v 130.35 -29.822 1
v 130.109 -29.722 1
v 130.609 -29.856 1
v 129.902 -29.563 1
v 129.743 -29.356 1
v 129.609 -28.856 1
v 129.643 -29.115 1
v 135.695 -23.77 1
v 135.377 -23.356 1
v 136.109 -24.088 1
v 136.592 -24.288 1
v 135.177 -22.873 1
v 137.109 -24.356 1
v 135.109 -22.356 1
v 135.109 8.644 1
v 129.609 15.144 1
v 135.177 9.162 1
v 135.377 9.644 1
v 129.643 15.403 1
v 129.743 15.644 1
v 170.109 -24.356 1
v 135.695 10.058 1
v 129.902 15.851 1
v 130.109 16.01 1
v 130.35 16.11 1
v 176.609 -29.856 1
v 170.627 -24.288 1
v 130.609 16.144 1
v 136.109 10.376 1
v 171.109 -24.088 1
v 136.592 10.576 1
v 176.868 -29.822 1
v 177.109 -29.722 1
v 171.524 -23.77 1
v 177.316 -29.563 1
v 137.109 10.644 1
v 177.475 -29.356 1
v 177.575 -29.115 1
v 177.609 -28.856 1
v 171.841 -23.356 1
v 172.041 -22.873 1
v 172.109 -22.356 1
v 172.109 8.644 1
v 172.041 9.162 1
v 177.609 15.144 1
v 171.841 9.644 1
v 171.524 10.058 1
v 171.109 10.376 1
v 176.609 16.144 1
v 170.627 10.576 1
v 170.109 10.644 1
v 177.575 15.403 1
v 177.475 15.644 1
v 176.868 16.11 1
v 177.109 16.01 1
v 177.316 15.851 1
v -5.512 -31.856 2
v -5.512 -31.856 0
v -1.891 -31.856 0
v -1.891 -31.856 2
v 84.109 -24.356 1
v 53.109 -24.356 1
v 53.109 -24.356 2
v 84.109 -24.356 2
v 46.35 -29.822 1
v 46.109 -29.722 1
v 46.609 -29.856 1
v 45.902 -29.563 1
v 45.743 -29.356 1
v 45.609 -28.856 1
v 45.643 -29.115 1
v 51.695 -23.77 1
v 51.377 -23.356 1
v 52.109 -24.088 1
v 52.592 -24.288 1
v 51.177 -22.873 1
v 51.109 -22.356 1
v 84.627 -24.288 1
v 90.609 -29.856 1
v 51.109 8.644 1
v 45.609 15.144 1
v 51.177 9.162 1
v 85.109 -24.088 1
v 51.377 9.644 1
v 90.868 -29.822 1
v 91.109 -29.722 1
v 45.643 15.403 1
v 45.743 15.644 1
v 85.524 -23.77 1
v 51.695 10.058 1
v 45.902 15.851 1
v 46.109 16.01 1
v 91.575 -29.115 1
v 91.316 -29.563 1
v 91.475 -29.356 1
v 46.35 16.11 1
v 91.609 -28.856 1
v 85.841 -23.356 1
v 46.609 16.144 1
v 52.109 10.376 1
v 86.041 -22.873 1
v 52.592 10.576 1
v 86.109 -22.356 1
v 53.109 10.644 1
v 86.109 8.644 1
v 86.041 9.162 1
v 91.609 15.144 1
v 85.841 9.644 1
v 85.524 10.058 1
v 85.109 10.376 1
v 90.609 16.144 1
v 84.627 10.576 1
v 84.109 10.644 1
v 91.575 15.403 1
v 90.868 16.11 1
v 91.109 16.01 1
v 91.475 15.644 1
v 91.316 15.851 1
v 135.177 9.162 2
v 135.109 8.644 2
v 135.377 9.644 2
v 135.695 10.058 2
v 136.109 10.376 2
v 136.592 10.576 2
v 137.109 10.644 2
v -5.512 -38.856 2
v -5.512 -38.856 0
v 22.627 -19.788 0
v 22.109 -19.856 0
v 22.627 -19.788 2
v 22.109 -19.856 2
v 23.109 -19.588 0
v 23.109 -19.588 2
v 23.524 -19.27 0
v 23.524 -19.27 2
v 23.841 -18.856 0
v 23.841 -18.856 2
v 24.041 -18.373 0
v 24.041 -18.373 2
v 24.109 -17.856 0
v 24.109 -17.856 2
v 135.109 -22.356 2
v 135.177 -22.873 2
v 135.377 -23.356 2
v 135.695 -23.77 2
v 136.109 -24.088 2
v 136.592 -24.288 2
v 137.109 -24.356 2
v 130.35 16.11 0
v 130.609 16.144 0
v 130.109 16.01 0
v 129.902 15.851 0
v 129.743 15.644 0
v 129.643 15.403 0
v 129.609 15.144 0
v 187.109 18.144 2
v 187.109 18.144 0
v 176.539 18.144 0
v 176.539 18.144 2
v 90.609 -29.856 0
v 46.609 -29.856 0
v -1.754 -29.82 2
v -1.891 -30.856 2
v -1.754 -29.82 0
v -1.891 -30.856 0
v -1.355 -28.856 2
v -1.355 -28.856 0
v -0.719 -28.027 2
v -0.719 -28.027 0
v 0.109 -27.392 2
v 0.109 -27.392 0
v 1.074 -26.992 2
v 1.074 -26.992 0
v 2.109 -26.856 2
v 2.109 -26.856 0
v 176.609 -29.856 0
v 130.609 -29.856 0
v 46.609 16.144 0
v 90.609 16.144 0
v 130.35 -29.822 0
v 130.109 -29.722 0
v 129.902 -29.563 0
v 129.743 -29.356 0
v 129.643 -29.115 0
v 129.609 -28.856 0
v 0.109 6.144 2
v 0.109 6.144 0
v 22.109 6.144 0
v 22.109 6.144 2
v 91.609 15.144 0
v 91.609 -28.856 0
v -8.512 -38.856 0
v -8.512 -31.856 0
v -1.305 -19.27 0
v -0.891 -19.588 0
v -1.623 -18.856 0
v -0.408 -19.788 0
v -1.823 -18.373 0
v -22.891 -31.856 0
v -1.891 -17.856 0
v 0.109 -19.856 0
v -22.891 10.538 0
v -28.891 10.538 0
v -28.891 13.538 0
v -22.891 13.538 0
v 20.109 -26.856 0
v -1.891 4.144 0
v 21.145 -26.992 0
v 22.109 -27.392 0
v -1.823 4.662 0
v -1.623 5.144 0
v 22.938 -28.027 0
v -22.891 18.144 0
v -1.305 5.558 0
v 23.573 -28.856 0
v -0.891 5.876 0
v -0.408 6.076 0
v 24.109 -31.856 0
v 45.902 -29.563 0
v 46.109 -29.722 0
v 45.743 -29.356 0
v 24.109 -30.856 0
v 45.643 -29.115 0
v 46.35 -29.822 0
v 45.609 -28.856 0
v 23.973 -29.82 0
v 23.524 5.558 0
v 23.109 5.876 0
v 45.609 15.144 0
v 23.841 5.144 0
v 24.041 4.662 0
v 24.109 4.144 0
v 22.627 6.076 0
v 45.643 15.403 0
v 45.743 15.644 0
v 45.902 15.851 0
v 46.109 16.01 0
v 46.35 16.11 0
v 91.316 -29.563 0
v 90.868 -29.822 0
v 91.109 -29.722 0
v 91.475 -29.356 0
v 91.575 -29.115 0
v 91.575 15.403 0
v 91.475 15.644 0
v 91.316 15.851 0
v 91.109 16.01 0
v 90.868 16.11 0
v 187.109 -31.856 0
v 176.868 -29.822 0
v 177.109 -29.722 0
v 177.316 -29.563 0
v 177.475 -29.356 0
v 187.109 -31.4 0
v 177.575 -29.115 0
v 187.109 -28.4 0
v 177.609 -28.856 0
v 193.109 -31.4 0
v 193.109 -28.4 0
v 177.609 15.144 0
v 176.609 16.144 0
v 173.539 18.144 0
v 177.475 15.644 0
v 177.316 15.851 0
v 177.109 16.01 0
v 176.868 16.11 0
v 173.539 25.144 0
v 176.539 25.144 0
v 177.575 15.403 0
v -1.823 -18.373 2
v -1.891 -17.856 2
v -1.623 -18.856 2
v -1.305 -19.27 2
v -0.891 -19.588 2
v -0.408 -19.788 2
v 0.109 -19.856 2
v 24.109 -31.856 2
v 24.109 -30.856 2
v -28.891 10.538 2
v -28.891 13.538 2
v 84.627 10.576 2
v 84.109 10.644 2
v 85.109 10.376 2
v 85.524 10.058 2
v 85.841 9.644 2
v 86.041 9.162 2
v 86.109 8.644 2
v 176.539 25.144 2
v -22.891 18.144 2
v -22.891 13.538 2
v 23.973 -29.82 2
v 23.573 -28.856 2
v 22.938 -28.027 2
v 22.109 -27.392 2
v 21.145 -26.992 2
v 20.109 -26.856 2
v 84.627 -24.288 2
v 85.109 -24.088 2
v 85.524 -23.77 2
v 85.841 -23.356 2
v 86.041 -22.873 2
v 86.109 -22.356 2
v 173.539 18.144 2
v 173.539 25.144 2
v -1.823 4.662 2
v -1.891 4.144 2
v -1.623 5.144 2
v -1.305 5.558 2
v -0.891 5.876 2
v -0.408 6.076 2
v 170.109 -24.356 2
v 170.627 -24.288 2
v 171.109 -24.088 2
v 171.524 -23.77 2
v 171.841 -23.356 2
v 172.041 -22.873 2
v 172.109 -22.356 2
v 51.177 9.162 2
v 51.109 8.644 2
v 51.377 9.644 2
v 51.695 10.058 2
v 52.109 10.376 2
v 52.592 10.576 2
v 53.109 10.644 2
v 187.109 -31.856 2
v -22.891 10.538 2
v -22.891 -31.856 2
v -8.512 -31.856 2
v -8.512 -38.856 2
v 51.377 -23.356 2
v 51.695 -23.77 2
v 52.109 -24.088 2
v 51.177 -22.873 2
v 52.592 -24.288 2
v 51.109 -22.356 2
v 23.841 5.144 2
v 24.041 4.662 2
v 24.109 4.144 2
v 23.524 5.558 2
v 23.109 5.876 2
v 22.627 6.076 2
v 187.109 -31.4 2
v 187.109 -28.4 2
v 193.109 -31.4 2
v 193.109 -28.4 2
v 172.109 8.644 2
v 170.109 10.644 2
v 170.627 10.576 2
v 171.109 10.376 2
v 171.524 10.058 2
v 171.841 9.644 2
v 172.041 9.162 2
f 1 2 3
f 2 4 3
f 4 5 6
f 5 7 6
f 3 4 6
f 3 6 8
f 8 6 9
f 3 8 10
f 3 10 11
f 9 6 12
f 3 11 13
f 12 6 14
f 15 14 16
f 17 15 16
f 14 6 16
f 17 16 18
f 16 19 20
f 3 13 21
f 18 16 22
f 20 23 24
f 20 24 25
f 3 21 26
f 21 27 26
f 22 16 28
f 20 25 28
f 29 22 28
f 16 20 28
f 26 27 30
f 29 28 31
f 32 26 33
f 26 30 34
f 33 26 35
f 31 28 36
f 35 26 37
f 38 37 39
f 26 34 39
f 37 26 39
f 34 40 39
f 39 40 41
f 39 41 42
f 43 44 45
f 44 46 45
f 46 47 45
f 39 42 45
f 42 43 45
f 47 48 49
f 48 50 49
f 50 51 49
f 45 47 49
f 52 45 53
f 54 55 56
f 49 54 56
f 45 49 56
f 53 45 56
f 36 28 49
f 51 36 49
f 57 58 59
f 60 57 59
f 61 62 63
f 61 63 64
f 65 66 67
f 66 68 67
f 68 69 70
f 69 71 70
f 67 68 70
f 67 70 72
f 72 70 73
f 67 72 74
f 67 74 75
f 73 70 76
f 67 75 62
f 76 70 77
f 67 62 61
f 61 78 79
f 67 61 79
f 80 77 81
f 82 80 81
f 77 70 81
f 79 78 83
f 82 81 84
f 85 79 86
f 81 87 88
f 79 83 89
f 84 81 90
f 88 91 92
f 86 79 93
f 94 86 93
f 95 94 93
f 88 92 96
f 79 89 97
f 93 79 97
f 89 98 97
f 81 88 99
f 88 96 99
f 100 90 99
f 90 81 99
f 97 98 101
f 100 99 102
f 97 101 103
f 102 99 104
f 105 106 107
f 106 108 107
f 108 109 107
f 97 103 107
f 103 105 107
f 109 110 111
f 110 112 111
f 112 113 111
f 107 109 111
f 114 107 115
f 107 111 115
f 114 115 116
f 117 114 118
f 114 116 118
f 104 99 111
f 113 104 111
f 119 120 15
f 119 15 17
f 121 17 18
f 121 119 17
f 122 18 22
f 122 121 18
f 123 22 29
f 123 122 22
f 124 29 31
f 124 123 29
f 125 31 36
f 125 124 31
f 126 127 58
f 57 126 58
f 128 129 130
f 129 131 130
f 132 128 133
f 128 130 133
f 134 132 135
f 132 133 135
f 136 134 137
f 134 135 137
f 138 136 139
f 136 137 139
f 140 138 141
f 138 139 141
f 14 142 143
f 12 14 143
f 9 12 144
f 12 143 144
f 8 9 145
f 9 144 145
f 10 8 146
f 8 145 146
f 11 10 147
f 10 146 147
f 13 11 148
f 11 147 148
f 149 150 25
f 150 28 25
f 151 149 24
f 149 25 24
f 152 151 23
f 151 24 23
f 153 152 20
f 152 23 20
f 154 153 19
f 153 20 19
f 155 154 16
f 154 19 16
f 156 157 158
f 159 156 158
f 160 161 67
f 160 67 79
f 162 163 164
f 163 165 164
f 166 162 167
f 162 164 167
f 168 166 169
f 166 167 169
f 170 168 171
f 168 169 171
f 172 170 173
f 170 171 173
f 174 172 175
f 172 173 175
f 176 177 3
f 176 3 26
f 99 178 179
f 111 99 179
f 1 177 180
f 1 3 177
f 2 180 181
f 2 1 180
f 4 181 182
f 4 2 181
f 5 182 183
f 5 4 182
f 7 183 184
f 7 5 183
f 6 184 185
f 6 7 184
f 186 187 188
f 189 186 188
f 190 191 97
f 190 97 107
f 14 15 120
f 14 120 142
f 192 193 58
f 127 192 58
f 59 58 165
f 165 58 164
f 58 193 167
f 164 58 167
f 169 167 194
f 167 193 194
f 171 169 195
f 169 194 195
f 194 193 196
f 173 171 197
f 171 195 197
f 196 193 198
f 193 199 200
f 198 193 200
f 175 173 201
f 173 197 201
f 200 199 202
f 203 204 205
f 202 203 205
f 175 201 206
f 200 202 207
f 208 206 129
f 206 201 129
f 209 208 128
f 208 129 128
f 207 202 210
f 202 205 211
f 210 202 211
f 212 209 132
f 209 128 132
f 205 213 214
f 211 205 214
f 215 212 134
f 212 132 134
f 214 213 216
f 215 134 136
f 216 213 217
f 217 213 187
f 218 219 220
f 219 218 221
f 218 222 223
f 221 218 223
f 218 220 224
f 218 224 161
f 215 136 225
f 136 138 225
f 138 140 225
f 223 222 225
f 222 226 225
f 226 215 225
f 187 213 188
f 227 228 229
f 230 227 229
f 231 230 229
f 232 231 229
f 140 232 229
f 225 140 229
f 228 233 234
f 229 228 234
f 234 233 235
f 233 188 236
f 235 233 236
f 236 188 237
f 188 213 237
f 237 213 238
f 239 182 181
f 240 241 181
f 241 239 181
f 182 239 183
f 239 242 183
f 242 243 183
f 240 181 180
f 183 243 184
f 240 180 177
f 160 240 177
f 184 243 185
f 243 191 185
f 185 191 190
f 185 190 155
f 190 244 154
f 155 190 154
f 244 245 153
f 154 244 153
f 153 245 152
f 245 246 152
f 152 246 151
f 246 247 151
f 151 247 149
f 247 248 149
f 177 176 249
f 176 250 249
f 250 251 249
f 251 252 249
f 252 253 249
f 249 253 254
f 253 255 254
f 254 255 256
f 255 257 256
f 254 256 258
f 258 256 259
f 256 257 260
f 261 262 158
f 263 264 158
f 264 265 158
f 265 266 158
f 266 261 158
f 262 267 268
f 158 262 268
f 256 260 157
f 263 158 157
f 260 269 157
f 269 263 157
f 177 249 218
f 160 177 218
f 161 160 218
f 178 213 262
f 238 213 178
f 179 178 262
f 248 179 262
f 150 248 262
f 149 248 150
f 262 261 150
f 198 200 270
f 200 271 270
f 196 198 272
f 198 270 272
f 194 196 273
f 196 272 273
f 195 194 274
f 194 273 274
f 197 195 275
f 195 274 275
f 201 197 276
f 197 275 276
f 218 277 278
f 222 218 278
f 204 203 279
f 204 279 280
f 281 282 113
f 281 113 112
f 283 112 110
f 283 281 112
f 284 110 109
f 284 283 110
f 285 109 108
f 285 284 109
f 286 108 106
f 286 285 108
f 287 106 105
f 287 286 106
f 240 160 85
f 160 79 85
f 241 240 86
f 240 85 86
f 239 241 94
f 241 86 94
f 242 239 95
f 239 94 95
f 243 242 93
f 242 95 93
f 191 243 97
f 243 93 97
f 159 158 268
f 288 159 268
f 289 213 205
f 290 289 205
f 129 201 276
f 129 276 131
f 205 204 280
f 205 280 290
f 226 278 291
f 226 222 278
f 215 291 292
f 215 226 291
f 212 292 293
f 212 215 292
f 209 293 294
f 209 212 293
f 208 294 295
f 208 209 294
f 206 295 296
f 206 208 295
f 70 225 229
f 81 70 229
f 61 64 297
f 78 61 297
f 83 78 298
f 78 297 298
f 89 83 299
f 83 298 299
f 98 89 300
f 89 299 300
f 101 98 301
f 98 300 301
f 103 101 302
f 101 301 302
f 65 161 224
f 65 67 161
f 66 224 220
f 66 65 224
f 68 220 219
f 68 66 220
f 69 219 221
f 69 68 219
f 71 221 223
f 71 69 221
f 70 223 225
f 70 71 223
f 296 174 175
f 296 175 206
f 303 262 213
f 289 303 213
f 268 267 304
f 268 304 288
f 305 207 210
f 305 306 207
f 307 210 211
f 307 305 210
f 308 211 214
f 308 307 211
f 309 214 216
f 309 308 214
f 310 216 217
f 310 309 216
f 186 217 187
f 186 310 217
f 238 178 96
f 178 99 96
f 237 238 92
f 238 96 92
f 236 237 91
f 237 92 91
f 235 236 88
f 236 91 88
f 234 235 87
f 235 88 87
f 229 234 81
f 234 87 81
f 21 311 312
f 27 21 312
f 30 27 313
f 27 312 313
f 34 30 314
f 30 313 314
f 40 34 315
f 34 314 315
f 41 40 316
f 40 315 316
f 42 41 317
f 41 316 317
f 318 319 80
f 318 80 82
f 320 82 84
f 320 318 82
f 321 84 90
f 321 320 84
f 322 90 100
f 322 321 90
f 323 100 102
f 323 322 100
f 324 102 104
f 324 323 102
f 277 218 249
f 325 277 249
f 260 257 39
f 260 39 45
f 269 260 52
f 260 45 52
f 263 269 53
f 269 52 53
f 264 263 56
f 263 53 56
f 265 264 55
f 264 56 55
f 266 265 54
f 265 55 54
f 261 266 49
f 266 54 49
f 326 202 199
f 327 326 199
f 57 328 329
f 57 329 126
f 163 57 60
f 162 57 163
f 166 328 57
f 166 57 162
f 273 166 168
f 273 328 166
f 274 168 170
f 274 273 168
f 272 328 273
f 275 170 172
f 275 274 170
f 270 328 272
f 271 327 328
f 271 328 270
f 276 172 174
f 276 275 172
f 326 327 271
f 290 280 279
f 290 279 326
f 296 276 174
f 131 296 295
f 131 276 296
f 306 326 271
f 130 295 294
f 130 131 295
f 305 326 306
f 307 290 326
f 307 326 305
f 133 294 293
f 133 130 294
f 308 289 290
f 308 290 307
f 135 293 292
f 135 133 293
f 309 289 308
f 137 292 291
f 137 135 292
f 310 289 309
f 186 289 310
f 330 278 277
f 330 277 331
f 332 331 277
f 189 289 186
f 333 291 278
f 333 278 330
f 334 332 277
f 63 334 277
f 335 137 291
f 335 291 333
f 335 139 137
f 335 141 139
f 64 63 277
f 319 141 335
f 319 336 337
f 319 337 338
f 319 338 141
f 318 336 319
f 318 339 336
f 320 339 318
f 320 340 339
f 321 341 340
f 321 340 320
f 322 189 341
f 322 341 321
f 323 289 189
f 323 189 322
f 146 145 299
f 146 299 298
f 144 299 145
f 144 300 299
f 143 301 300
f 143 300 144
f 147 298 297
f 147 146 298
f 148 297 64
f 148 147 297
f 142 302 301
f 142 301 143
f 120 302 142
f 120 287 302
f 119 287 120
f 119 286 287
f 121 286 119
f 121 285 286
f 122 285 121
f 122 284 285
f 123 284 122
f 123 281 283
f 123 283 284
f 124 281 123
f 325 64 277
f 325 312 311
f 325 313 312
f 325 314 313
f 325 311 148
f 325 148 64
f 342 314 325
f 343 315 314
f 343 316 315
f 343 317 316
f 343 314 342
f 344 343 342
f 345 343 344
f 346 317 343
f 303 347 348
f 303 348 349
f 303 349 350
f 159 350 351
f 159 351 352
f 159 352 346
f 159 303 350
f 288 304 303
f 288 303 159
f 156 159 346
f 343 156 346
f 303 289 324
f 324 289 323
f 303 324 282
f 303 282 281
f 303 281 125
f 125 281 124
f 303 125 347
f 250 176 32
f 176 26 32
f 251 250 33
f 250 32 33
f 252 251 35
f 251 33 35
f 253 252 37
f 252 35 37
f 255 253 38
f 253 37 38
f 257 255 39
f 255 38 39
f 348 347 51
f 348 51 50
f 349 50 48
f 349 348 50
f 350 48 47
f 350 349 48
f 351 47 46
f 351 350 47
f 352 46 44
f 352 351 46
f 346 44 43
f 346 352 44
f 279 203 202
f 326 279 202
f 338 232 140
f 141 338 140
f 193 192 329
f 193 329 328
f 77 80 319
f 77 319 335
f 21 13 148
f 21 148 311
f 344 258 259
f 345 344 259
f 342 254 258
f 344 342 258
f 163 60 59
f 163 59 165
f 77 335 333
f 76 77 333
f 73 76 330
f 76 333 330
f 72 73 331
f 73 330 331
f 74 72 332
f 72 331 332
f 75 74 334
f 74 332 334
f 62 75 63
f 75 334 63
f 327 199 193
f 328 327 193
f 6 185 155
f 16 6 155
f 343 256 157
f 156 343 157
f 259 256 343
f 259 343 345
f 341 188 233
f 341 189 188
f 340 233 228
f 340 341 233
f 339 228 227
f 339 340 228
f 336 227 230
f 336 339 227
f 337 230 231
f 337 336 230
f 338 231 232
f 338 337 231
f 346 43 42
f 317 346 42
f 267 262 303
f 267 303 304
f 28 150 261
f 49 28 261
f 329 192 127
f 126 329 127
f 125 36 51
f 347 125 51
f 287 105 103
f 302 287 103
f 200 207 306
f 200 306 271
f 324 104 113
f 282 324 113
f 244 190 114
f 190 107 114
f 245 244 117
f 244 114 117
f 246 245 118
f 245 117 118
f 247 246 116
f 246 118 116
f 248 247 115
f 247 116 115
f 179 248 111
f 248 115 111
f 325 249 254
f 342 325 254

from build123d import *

# Parameters (mm, degrees)
F1_DEPTH  = 2
F2_W      = 26
F2_H      = 26
F3_DEPTH  = 15.4
F4_W      = 35
F4_H      = 35
F4_W_2    = 37
F5_DEPTH  = 25
F6_W      = 26
F6_H      = 5
F7_DEPTH  = 25
F8_R      = 4
F9_R      = 2
F10_W     = 46
F10_H     = 46
F10_W_2   = 48
F11_DEPTH = 1
F12_R     = 1
F13_R     = 1
F0_W      = 6
F0_H      = 3
F0_W_2    = 3
F0_H_2    = 7
F14_DEPTH = 2


# Not quite as in the source:
# - a feature names something its author has since deleted; it is built from what else it names


with BuildPart() as f1:
    # F0 (on Top) → F1 (new body)
    with BuildSketch(Plane.XY):
        Polygon((173.5389735401, 18.1442317292), (-22.8906879723, 18.1442317292), (-22.8906879723, 13.5384923518), (-22.8906879723, 10.5384923518), (-22.8906879723, -31.8557682708), (-8.5117332786, -31.8557682708), (-5.5117332786, -31.8557682708), (187.1093120277, -31.8557682708), (187.1093120277, -31.4002893865), (187.1093120277, -28.4002893865), (187.1093120277, 18.1442317292), (176.5389735401, 18.1442317292), align=None)
    extrude(amount=F1_DEPTH)

    # F2 (on face) → F3 (cut)
    with BuildSketch(Plane(origin=(0, 0, 0), x_dir=(1, 0, 0), z_dir=(0, 0, -1))):
        with Locations((11.1093120277, 6.8557682708)):
            Rectangle(F2_W, F2_H)
    extrude(amount=-F3_DEPTH, mode=Mode.SUBTRACT)

    # F4 (on face) → F5 (cut)
    with BuildSketch(Plane(origin=(0, 0, 0), x_dir=(1, 0, 0), z_dir=(0, 0, -1))):
        with Locations((68.6093120277, 6.8557682708)):
            Rectangle(F4_W, F4_H)
        with Locations((153.6093120277, 6.8557682708)):
            Rectangle(F4_W_2, F4_H)
    extrude(amount=-F5_DEPTH, mode=Mode.SUBTRACT)

    # F6 (on face) → F7 (cut)
    with BuildSketch(Plane.XY.offset(2)):
        with Locations((11.1093120277, -29.3557682708)):
            Rectangle(F6_W, F6_H)
    extrude(amount=-F7_DEPTH, mode=Mode.SUBTRACT)

    # F8
    f8_edges = [f1.edges().sort_by_distance(p)[0] for p in [
        (-1.890688, -26.855768, 1),
        (24.109312, -26.855768, 1),
    ]]
    fillet(f8_edges, radius=F8_R)

    # F9
    f9_edges = [f1.edges().sort_by_distance(p)[0] for p in [
        (51.109312, 10.644232, 1),
        (86.109312, 10.644232, 1),
        (51.109312, -24.355768, 1),
        (135.109312, -24.355768, 1),
        (86.109312, -24.355768, 1),
        (172.109312, -24.355768, 1),
        (135.109312, 10.644232, 1),
        (172.109312, 10.644232, 1),
        (24.109312, 6.144232, 1),
        (-1.890688, 6.144232, 1),
        (24.109312, -19.855768, 1),
        (-1.890688, -19.855768, 1),
    ]]
    fillet(f9_edges, radius=F9_R)

    # F10 (on face) → F11 (cut)
    with BuildSketch(Plane.XY):
        with Locations((68.6093120277, -6.8557682708)):
            Rectangle(F10_W, F10_H)
        with Locations((153.6093120277, -6.8557682708)):
            Rectangle(F10_W_2, F10_H)
    extrude(amount=F11_DEPTH, mode=Mode.SUBTRACT)

    # F12
    f12_edges = [f1.edges().sort_by_distance(p)[0] for p in [
        (45.609312, -29.855768, 0.5),
        (91.609312, -29.855768, 0.5),
        (91.609312, 16.144232, 0.5),
        (45.609312, 16.144232, 0.5),
    ]]
    fillet(f12_edges, radius=F12_R)

    # F13
    f13_edges = [f1.edges().sort_by_distance(p)[0] for p in [
        (129.609312, -29.855768, 0.5),
        (177.609312, -29.855768, 0.5),
        (177.609312, 16.144232, 0.5),
        (129.609312, 16.144232, 0.5),
    ]]
    fillet(f13_edges, radius=F13_R)

    # F0 (on Top) → F14 (join)
    with BuildSketch(Plane.XY):
        with Locations((190.1093120277, -29.9002893865)):
            Rectangle(F0_W, F0_H)
        with Locations((175.0389735401, 21.6442317292)):
            Rectangle(F0_W_2, F0_H_2)
        with Locations((-7.0117332786, -35.3557682708)):
            Rectangle(F0_W_2, F0_H_2)
        with Locations((-25.8906879723, 12.0384923518)):
            Rectangle(F0_W, F0_H)
    extrude(amount=F14_DEPTH)


solid = f1.part
